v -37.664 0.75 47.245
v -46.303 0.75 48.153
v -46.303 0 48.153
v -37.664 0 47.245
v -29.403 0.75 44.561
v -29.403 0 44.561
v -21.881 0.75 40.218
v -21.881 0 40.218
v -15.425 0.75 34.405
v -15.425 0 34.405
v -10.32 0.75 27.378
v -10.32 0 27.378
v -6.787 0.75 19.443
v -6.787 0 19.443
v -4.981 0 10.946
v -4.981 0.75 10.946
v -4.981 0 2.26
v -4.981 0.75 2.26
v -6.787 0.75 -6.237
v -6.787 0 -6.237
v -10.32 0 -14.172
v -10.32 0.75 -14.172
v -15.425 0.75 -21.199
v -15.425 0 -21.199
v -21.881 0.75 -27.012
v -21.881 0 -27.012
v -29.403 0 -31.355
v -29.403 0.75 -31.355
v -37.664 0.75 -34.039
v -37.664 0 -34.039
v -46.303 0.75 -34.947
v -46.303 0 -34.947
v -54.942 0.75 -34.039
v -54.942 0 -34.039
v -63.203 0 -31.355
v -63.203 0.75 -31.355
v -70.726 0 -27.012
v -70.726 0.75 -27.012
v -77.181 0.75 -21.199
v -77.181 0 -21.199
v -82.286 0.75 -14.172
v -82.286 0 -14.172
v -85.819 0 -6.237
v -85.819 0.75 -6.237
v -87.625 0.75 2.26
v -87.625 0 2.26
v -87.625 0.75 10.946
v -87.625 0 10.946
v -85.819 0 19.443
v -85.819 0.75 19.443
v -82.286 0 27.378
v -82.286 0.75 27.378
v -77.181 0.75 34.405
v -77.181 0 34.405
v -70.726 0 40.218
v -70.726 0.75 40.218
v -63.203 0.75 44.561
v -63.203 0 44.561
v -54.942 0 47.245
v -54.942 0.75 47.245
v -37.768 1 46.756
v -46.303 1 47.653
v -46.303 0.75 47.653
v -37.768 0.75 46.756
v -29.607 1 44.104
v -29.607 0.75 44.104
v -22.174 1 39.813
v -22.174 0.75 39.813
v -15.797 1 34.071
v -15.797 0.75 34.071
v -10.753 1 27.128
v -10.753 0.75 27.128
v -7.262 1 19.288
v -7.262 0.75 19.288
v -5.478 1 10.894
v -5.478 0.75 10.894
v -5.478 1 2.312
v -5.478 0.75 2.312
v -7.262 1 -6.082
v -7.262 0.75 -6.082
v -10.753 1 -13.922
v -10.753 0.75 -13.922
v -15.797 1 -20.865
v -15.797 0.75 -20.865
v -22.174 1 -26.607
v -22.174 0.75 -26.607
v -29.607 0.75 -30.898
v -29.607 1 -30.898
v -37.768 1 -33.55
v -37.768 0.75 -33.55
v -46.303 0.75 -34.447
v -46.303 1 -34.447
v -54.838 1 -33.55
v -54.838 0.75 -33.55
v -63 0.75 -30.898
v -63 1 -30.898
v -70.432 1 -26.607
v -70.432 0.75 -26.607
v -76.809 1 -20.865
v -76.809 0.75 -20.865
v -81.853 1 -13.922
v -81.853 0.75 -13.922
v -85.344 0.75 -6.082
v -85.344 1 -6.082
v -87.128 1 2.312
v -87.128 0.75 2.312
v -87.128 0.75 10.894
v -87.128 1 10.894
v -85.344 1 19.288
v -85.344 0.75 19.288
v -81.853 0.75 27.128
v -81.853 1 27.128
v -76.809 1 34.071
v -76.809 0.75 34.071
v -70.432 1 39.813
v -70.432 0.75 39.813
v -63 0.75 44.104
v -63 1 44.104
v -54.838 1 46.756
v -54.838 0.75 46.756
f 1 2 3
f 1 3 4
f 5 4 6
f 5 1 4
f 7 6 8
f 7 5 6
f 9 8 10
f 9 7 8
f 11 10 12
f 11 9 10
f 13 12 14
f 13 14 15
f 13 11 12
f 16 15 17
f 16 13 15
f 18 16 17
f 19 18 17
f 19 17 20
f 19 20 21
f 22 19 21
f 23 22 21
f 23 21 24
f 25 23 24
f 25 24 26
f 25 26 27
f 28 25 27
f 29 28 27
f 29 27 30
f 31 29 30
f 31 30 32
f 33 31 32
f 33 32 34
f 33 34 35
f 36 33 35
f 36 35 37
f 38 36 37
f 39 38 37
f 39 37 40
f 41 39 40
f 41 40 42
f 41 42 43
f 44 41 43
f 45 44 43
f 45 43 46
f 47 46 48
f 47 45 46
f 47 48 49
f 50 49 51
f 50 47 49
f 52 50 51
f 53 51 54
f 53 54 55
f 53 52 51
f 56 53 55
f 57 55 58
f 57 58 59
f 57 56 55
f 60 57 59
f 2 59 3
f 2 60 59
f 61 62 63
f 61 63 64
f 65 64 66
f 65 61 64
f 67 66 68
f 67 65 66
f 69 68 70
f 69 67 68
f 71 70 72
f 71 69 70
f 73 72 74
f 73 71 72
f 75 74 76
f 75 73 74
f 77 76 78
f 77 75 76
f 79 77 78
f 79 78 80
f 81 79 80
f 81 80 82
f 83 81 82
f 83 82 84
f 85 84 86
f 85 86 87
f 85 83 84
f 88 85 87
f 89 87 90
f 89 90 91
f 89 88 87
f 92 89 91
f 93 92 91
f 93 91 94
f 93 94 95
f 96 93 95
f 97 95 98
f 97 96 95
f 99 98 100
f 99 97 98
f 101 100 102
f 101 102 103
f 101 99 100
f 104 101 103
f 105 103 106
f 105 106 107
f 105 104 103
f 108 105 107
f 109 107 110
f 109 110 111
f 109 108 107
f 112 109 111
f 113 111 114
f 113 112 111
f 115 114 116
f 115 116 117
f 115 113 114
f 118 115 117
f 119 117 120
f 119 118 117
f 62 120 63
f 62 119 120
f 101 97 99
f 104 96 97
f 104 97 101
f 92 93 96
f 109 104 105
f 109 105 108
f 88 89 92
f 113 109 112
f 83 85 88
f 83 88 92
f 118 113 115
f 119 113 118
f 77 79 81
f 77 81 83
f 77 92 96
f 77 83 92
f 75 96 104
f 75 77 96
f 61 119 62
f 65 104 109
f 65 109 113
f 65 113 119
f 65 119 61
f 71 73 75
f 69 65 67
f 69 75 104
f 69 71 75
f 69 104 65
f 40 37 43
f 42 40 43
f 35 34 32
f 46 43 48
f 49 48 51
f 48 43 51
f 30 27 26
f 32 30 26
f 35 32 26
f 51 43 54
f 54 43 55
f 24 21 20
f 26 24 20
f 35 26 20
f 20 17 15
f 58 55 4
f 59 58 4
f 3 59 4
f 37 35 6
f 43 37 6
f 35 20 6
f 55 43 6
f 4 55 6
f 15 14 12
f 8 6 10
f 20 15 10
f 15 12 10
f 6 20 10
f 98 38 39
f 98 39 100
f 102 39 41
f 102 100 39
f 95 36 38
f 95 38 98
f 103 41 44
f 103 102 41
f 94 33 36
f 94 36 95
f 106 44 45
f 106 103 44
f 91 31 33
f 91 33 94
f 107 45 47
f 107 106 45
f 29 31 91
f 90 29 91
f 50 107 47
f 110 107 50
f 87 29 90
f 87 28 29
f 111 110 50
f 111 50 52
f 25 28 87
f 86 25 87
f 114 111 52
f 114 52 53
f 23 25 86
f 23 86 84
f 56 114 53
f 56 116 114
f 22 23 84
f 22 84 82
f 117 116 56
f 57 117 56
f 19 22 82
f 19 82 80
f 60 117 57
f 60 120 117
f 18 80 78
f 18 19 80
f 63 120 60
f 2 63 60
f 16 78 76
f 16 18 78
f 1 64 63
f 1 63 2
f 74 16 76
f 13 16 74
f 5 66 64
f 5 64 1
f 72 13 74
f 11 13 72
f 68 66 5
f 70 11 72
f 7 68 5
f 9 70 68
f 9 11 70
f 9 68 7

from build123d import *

# Parameters (mm, degrees)
SKETCH1_R           = 42.55
BOSS_EXTRUDE1_DEPTH = 1
SKETCH2_R           = 42.55
SKETCH2_R_2         = 41.55
CUT_EXTRUDE1_DEPTH  = 102.547405362
SKETCH3_R           = 41.55
SKETCH3_R_2         = 41.05
CUT_EXTRUDE2_DEPTH  = 0.25


with BuildPart() as part:
    # Sketch1 → Boss-Extrude1 (new body)
    with BuildSketch(Plane(origin=(0, 0, 0), x_dir=(1, 0, 0), z_dir=(0, 1, 0))):
        with Locations(Location((-46.303063169, -6.602911423, 0), (0, 0, 270))):
            Circle(SKETCH1_R)
    extrude(amount=BOSS_EXTRUDE1_DEPTH)

    # Sketch2 → Cut-Extrude1 (cut, through all)
    with BuildSketch(Plane(origin=(0, 1, 0), x_dir=(1, 0, 0), z_dir=(0, 1, 0))):
        with Locations((-46.303063169, -6.602911423)):
            Circle(SKETCH2_R)
        with Locations(Location((-46.303063169, -6.602911423, 0), (0, 0, 270))):
            Circle(SKETCH2_R_2, mode=Mode.SUBTRACT)
    extrude(amount=-CUT_EXTRUDE1_DEPTH, mode=Mode.SUBTRACT)

    # Sketch3 → Cut-Extrude2 (cut)
    with BuildSketch(Plane(origin=(0, 1, 0), x_dir=(1, 0, 0), z_dir=(0, 1, 0))):
        with Locations(Location((-46.303063169, -6.602911423, 0), (0, 0, 270))):
            Circle(SKETCH3_R)
        with Locations(Location((-46.303063169, -6.602911423, 0), (0, 0, 270))):
            Circle(SKETCH3_R_2, mode=Mode.SUBTRACT)
    extrude(amount=-CUT_EXTRUDE2_DEPTH, mode=Mode.SUBTRACT)


solid = part.part
